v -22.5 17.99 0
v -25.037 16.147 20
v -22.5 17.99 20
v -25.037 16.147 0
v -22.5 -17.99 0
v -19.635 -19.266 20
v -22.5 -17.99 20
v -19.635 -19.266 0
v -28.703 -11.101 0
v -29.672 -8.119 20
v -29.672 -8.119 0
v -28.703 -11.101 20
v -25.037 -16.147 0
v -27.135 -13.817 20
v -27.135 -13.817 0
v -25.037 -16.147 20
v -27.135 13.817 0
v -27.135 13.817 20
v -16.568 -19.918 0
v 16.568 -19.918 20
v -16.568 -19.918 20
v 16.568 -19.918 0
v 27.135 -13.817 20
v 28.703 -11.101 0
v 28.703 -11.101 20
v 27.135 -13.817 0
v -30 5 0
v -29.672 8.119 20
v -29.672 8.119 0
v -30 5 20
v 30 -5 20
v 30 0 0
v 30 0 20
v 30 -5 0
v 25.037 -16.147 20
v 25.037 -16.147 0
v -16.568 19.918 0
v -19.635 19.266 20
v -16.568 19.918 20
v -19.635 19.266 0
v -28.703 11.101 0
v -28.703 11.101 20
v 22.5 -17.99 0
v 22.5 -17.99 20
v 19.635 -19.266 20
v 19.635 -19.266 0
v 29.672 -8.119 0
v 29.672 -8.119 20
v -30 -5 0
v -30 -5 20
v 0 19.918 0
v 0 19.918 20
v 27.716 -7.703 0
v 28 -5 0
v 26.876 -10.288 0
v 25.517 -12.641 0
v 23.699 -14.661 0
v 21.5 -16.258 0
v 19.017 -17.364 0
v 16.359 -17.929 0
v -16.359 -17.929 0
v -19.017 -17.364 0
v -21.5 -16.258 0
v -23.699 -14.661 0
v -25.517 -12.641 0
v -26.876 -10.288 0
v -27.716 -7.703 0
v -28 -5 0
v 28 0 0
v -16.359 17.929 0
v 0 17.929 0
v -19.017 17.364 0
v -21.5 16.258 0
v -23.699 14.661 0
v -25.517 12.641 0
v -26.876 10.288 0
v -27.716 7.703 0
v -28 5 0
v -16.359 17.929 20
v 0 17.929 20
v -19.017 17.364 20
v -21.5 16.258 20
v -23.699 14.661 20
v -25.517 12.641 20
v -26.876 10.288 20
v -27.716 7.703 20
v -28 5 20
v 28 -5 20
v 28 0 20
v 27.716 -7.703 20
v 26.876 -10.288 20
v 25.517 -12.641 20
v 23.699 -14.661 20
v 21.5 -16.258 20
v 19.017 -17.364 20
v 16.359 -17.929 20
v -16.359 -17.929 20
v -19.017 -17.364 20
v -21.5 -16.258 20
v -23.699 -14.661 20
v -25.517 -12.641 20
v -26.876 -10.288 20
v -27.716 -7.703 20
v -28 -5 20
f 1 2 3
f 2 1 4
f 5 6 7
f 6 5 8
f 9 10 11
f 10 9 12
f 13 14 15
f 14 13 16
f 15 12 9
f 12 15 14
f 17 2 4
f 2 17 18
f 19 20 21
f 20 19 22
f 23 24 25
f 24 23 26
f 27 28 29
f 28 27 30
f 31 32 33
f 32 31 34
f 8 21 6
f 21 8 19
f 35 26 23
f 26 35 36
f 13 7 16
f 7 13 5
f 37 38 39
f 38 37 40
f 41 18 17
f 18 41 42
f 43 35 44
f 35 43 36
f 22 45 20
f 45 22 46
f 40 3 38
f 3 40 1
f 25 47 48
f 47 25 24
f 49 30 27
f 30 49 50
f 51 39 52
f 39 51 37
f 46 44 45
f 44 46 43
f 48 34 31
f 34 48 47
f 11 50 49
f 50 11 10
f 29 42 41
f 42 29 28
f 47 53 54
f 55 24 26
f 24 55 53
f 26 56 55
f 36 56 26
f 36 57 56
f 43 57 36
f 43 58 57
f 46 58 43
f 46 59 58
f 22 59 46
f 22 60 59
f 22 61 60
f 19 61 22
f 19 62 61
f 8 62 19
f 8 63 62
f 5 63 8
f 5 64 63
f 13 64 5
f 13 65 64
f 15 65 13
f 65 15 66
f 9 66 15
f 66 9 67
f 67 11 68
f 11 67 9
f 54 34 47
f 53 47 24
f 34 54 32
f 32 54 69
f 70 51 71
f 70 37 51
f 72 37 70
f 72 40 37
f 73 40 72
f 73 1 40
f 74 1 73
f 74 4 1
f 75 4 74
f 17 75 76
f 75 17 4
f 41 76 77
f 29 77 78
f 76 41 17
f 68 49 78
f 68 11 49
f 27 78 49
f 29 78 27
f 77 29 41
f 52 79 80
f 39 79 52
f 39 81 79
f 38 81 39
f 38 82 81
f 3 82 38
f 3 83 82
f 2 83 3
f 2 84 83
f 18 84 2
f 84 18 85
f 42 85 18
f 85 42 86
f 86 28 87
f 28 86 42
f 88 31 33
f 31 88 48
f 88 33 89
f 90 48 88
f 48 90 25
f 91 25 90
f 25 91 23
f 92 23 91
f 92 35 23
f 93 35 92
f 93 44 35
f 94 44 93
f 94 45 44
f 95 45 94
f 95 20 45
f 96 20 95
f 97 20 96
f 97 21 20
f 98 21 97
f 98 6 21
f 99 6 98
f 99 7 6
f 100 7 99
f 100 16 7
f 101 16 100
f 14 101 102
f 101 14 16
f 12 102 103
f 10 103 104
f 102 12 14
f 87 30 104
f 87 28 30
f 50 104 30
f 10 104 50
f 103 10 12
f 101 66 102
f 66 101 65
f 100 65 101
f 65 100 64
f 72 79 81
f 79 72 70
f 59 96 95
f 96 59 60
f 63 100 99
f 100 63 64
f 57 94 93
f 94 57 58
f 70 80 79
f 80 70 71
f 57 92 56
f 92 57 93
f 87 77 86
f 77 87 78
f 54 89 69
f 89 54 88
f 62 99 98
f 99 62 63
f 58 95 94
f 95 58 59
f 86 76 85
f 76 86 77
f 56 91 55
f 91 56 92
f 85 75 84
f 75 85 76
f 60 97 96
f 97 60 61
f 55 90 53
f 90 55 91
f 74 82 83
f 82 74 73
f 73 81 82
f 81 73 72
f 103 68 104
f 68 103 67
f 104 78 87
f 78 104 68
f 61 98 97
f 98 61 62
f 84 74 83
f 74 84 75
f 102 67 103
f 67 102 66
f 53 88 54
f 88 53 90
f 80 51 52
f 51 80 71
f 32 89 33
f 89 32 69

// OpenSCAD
// file: BoxCommon.scad
// Sum array members:
function suma(array,start,end) =
    (start==end)
    ? array[start]
    : suma(array, start+1, end) + array[start];
function e(clear,o) =// Add clear to demensions of o
     (is_list(clear)) ?
        [o.x+clear.x,o.y+clear.y,o.z+clear.z] :
        [o.x+clear,o.y+clear,o.z+clear];

function align(mode,here,center=true)=
    [ search(mode,"eErR")?here.x:(search(mode,"wWlL")?0:here.x/2),
    search(mode,"nN")?here.y:(search(mode,"sS")?0:here.y/2),
    search(mode,"tT")?here.z:(search(mode,"bB")?0:here.z/2)]-
    (center?[here.x/2,here.y/2, here.z/2]:[0,0,0]);


module cubeXY(cc)
{
    translate([-cc.x/2,-cc.y/2, 0]) cube(cc,center=false);
}


// The size of the block that holds the display. Determines width.
DISPBLOCK=[16+50.2*3,44,15]; // Z is arbitrary at the moment

// The real size of the front panel
panelDim=[DISPBLOCK.x,DISPBLOCK.y,0]+[20,70,3.2];
lipHt=10;
outsideR=10;

// FF=Fudge Factor

DMM_BOARD_X=66 ; // 63 NO FF FROM DRAWING
DMM_BOARD_Y=3 ; // 1.6 NO FF Measured
//DMM_Center=[50,-20,0];

// Extra board locations relative to the DMM board:
CPU_Board_Loc=[0,27,6];  // Not using full width of the board
// loc is offset left to miss drilling the screw block.
IF_Board_Loc=[0,15,6];
boards=[[0,0,0],IF_Board_Loc,CPU_Board_Loc];


S_VO_OFFS=-19.08; // From drawing
S_Widths=14; // FROM Drawing
// Places 5A jack at edge of board.:
S_FUDGE=DMM_BOARD_X/2-S_Widths*2-2; 
S1=-S_Widths/2+S_FUDGE;
S0=S_VO_OFFS+S1;
S2=S_Widths/2+S_FUDGE; 
S3=S2+S_Widths;
DMM_JAX_X=[S0,S1,S2,S3];

// STack up to C/L of jack in Y - Measured terms
DMM_JAX_Y=DMM_BOARD_Y/2+4.9+5.5/2; 
DMM_JAX_LOWER_DIA=12; // Measured
DMM_JAX_UPPER_DIA=15; // Same as S_Widths
DMM_JAX_Z_OFFS=3.3 ; // How much of the lower shoulder shows.

for (i=[DMM_JAX_X])
    echo(i);
echo(DMM_JAX_Y);
// main file
// Pull this file in with use<>

include <BoxCommon.scad>



// innerPanel => the size of the panel at the origin of
// the outer radii

// panel=> the x/y/z size of the panel extents
// lip => z of lip above the panel
// RO,RL,RI => the outer most, middle, and inner most radius

module dressPanel(panel,lipHt, RO,RL,RI)
{
    innerPanel=[panel.x-RO*2, panel.y-RO*2,panel.z-1];
    
    // Virtually center the panel on the origin
    translate([-innerPanel.x/2,-innerPanel.y/2,0])
    {
        minkowski()
        {
            cube(innerPanel,center=false);
            cylinder(r=RO,h=1);
        }

        translate([0,0,panel.z])
        {
            difference()
            {
                minkowski()
                {
                    cube(innerPanel,center=false);
                    cylinder(r=RL,h=lipHt);
                }
                minkowski()
                {
                    cube(innerPanel,center=false);
                    cylinder(r=RI,h=lipHt+1);
                }
            }
        }
    }
}

module outerShell(panel, RO,RL)
{
    ht2=panel.z/2;
    innerPanel=[panel.x-RO*2, panel.y-RO*2,ht2];
    
    // Virtually center the panel on the origin
    translate([-innerPanel.x/2,-innerPanel.y/2,0])
    {

        difference()
        {
            minkowski()
            {
                cube(innerPanel,center=false);
                cylinder(r=RO,h=ht2);
            }
            translate([0,0,-.5])
            minkowski()
            {
                cube(innerPanel,center=false);
                cylinder(r=RL,h=ht2+1);
            }
        }
    }
}

module testDressPanel()
{   
    R=15;
    
    difference()
    {
        dressPanel([60,40,4],6,R,R-3,R-6);
        cube([100,100,20]);
    }
}

module testOuterShell()
{

R=15;
    
    difference()
    {
        outerShell([60,40,20],R,R-2);
        cube([100,100,20]);
    }
}
//testDressPanel();
testOuterShell();
